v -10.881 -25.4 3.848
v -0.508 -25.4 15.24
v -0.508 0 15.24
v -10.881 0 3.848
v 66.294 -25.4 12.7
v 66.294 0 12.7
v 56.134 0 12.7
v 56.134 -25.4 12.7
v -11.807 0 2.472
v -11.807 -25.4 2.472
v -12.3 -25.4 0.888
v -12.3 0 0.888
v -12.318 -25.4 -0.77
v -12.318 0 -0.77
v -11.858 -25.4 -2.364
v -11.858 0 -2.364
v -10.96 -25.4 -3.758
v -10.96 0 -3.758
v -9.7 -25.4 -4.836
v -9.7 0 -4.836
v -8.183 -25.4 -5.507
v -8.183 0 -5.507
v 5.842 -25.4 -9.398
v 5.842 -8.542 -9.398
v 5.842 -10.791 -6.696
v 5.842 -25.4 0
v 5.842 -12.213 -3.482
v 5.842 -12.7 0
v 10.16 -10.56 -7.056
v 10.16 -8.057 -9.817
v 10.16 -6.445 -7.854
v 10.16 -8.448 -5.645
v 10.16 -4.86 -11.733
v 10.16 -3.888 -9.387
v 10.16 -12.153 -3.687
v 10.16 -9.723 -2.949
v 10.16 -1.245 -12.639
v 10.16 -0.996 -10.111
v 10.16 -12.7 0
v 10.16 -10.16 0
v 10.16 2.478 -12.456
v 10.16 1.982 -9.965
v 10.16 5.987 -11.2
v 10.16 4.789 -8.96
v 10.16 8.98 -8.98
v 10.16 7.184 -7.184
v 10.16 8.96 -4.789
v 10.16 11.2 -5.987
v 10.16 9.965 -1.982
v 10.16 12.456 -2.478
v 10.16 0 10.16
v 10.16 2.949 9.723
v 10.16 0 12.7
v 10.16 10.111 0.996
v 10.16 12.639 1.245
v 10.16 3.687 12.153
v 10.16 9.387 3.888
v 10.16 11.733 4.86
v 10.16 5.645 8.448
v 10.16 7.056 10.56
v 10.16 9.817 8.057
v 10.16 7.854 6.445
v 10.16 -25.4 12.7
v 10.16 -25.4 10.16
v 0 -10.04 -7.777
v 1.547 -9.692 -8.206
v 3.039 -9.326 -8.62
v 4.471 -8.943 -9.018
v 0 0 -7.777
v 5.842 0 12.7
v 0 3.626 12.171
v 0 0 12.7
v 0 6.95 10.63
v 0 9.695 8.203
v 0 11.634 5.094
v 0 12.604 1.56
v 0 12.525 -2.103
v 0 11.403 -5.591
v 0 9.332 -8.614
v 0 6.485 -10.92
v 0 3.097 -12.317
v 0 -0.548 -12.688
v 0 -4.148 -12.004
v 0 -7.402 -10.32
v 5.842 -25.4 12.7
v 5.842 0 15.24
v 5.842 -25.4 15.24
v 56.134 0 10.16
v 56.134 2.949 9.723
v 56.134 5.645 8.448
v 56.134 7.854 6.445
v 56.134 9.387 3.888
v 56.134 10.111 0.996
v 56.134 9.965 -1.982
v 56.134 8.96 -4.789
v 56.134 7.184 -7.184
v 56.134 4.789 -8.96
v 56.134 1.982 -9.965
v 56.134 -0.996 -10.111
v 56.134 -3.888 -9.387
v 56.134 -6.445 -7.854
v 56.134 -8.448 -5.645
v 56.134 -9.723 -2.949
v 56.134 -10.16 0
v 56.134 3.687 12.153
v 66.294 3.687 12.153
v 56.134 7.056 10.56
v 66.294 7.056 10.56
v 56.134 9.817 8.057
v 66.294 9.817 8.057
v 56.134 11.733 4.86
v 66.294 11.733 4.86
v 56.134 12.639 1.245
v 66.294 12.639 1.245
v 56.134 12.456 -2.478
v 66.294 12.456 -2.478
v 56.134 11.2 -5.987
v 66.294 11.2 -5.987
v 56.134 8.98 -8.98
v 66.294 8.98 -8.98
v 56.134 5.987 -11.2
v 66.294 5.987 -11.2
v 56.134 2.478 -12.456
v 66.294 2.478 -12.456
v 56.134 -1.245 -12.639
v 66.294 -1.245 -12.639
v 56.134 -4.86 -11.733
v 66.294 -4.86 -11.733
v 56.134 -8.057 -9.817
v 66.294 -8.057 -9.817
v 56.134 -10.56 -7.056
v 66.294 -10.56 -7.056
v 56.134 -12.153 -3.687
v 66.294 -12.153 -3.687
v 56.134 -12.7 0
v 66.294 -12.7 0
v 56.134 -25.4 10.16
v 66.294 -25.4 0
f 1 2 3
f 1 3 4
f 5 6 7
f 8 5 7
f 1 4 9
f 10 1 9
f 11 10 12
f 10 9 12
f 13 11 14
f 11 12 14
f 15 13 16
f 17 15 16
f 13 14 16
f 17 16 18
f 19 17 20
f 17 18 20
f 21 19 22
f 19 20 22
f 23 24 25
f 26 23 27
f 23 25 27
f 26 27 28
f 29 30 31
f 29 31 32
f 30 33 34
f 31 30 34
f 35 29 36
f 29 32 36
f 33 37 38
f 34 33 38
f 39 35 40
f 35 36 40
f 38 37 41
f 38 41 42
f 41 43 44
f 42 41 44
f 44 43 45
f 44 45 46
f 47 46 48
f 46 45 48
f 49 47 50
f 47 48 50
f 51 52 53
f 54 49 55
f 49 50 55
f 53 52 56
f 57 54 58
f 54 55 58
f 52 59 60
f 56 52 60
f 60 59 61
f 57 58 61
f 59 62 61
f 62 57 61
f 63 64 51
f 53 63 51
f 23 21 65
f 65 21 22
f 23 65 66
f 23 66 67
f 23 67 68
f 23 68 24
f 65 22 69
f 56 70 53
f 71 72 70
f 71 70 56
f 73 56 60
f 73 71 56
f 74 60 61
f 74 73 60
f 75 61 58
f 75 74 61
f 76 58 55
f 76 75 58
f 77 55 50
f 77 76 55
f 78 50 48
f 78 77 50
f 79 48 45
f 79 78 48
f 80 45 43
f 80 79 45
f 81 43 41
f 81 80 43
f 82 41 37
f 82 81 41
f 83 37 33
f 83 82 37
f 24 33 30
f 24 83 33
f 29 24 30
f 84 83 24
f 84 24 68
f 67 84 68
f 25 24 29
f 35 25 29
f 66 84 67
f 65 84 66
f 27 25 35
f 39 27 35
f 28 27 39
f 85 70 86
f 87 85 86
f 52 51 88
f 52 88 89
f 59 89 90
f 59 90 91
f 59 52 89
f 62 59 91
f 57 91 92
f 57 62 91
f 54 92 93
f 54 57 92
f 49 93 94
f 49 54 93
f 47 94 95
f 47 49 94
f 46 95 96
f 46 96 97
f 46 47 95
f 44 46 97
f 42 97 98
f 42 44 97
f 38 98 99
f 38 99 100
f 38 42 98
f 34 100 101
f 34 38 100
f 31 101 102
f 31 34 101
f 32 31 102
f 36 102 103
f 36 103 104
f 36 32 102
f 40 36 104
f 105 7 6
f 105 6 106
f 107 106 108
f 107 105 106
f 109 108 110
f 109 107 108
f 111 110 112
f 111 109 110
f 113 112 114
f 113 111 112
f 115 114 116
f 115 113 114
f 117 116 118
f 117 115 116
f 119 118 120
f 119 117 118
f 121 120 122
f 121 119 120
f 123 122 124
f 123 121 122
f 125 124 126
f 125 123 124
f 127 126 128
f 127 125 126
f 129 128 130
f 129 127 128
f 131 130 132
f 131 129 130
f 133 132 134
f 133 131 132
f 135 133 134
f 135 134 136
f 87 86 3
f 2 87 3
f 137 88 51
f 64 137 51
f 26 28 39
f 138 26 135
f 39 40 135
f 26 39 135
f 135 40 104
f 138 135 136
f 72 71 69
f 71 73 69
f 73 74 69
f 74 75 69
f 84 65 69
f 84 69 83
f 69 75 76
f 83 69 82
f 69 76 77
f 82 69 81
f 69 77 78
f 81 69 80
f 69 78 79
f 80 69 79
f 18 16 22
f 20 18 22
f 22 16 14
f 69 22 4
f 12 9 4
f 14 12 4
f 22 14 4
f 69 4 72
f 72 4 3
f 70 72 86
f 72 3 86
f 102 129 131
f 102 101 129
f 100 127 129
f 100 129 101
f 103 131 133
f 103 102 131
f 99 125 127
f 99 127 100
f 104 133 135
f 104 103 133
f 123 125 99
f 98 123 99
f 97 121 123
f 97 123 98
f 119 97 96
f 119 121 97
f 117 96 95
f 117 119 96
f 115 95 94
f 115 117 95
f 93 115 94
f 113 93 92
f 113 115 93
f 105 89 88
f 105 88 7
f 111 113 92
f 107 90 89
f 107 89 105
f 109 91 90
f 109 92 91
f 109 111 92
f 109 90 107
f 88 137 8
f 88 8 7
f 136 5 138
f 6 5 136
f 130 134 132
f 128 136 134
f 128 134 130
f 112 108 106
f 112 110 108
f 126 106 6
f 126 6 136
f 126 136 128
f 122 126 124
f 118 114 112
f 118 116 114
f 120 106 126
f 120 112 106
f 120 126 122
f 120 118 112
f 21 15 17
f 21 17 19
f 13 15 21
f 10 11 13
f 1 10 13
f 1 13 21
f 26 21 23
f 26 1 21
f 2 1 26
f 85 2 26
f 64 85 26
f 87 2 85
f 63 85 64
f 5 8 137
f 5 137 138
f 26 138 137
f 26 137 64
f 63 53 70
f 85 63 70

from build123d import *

# Parameters (mm, degrees)
F0_W     = 5.842
F0_H     = 12.7
F0_R     = 3.175
F2_DEPTH = 25.4


with BuildPart() as f1:
    # F0 (on Front) → F1 (revolve)
    with BuildSketch(Plane.XZ):
        Polygon((5.842, 12.7), (5.842, 0), (66.294, 0), (66.294, 12.7), (56.134, 12.7), (56.134, 10.16), (10.16, 10.16), (10.16, 12.7), align=None)
        with Locations((2.921, 6.35)):
            Rectangle(F0_W, F0_H)
    revolve(axis=Axis((33.147, 0, 0), (-1, 0, 0)))

    # F0 (on Front) → F2 (join)
    with BuildSketch(Plane.XZ):
        Polygon((5.842, 12.7), (5.842, 0), (66.294, 0), (66.294, 12.7), (56.134, 12.7), (56.134, 10.16), (10.16, 10.16), (10.16, 12.7), align=None)
        with BuildLine():
            ThreePointArc((-8.1826630726, -5.5069827884), (-3.1957909266, -4.5493385486), (-0.9398, 0))
            ThreePointArc((-0.9398, 0), (-4.5919612295, 5.3297205562), (-10.8806298187, 3.8475430269))
            ThreePointArc((-10.8806298187, 3.8475430269), (-12.1459778134, -1.5837270034), (-8.1826630726, -5.5069827884))
        make_face()
        with Locations((-6.6548, 0)):
            Circle(F0_R, mode=Mode.SUBTRACT)
        with BuildLine():
            Line((-0.9398, 0), (0, 0))
            Line((0, 0), (0, 12.7))
            Line((0, 12.7), (5.842, 12.7))
            Line((5.842, 12.7), (5.842, 15.24))
            Line((5.842, 15.24), (-0.508, 15.24))
            Line((-0.508, 15.24), (-10.8806298187, 3.8475430269))
            ThreePointArc((-10.8806298187, 3.8475430269), (-4.5919612295, 5.3297205562), (-0.9398, 0))
        make_face()
        with Locations((2.921, 6.35)):
            Rectangle(F0_W, F0_H)
        with BuildLine():
            Line((5.842, 0), (0, 0))
            Line((0, 0), (-0.9398, 0))
            ThreePointArc((-0.9398, 0), (-3.1957909266, -4.5493385486), (-8.1826630726, -5.5069827884))
            Line((-8.1826630726, -5.5069827884), (5.842, -9.398))
            Line((5.842, -9.398), (5.842, 0))
        make_face()
        with Locations((-6.6548, 0)):
            Circle(F0_R)
    extrude(amount=F2_DEPTH)


solid = f1.part
